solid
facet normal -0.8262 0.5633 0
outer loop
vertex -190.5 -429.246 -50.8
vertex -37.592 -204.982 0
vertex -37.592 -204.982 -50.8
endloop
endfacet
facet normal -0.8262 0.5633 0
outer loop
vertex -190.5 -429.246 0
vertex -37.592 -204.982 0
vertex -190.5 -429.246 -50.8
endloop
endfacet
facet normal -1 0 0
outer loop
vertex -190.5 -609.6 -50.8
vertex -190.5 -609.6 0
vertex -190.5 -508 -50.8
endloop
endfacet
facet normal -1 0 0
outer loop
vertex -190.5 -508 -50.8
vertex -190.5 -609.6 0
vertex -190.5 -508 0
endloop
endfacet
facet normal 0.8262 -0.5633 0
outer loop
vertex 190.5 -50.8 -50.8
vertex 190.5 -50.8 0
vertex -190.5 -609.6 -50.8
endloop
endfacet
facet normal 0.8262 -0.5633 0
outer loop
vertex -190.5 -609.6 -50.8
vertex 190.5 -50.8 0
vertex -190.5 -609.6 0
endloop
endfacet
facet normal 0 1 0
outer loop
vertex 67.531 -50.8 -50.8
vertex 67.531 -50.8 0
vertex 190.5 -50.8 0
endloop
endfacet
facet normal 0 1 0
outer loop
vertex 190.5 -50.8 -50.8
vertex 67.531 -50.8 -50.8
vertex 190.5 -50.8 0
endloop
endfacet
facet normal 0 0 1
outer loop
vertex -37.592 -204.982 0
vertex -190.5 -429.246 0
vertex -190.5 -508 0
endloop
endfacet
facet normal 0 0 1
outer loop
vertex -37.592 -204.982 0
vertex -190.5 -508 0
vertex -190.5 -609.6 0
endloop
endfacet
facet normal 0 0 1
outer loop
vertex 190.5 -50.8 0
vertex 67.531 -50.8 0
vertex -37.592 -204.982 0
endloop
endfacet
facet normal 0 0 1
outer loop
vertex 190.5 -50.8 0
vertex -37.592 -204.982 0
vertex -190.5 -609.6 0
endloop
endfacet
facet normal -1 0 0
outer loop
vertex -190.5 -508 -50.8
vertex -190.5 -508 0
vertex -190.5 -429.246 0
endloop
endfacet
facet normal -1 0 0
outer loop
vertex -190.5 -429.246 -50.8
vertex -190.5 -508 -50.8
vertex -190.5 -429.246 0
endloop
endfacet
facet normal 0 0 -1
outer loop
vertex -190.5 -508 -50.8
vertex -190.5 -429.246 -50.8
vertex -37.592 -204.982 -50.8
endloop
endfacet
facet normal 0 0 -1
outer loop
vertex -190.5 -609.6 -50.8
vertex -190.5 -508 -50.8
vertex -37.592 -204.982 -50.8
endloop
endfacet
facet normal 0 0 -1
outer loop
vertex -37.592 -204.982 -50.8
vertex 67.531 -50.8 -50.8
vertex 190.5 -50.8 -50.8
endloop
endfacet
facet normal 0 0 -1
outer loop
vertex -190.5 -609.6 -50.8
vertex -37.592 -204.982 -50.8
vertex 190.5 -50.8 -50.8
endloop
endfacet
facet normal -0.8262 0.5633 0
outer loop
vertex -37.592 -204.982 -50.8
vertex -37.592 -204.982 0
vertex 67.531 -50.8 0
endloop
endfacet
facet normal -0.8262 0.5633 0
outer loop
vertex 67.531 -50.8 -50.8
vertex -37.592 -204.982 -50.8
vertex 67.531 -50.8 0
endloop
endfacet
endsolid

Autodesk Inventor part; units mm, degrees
ref_plane "YZ Plane" through (0, 0, 0) normal (1, 0, 0) x (0, 1, 0)
ref_plane "XZ Plane" through (0, 0, 0) normal (0, 1, 0) x (-1, 0, 0)
ref_plane "XY Plane" through (0, 0, 0) normal (0, 0, 1) x (1, 0, 0)
ref_plane "Work Plane1" through (0, 0, 0) normal (0, 0, 1) x (1, 0, 0)
sketch "Sketch1" plane through (0, 0, 0) normal (0, 0, 1) x (1, 0, 0)
  line L0 (-190.5, -50.8) -> (190.5, -50.8) projected
  line L1 (-190.5, -609.6) -> (-190.5, -508) projected
  line L2 (190.5, -50.8) -> (-190.5, -609.6)
  line L3 (-190.5, -508) -> (-190.5, 1727.2) projected
  line L4 (-37.5923, -204.9815) -> (-190.5, -429.2461)
  line L5 (-37.5923, -204.9815) -> (67.5314, -50.8)
  line L6 (190.5, -50.8) -> (67.5314, -50.8)
  line L7 (-190.5, -429.2461) -> (-190.5, -609.6)
  point P0 (0, 0)
  point P1 (-190.5, -429.2461)
  dimension "d0" = 101.6
extrude "Extrusion1" add sketch "Sketch1" against normal blind 50.8 contours L0 L2 L1 L3 L4 L5
properties part number "Top of head diagonals"
